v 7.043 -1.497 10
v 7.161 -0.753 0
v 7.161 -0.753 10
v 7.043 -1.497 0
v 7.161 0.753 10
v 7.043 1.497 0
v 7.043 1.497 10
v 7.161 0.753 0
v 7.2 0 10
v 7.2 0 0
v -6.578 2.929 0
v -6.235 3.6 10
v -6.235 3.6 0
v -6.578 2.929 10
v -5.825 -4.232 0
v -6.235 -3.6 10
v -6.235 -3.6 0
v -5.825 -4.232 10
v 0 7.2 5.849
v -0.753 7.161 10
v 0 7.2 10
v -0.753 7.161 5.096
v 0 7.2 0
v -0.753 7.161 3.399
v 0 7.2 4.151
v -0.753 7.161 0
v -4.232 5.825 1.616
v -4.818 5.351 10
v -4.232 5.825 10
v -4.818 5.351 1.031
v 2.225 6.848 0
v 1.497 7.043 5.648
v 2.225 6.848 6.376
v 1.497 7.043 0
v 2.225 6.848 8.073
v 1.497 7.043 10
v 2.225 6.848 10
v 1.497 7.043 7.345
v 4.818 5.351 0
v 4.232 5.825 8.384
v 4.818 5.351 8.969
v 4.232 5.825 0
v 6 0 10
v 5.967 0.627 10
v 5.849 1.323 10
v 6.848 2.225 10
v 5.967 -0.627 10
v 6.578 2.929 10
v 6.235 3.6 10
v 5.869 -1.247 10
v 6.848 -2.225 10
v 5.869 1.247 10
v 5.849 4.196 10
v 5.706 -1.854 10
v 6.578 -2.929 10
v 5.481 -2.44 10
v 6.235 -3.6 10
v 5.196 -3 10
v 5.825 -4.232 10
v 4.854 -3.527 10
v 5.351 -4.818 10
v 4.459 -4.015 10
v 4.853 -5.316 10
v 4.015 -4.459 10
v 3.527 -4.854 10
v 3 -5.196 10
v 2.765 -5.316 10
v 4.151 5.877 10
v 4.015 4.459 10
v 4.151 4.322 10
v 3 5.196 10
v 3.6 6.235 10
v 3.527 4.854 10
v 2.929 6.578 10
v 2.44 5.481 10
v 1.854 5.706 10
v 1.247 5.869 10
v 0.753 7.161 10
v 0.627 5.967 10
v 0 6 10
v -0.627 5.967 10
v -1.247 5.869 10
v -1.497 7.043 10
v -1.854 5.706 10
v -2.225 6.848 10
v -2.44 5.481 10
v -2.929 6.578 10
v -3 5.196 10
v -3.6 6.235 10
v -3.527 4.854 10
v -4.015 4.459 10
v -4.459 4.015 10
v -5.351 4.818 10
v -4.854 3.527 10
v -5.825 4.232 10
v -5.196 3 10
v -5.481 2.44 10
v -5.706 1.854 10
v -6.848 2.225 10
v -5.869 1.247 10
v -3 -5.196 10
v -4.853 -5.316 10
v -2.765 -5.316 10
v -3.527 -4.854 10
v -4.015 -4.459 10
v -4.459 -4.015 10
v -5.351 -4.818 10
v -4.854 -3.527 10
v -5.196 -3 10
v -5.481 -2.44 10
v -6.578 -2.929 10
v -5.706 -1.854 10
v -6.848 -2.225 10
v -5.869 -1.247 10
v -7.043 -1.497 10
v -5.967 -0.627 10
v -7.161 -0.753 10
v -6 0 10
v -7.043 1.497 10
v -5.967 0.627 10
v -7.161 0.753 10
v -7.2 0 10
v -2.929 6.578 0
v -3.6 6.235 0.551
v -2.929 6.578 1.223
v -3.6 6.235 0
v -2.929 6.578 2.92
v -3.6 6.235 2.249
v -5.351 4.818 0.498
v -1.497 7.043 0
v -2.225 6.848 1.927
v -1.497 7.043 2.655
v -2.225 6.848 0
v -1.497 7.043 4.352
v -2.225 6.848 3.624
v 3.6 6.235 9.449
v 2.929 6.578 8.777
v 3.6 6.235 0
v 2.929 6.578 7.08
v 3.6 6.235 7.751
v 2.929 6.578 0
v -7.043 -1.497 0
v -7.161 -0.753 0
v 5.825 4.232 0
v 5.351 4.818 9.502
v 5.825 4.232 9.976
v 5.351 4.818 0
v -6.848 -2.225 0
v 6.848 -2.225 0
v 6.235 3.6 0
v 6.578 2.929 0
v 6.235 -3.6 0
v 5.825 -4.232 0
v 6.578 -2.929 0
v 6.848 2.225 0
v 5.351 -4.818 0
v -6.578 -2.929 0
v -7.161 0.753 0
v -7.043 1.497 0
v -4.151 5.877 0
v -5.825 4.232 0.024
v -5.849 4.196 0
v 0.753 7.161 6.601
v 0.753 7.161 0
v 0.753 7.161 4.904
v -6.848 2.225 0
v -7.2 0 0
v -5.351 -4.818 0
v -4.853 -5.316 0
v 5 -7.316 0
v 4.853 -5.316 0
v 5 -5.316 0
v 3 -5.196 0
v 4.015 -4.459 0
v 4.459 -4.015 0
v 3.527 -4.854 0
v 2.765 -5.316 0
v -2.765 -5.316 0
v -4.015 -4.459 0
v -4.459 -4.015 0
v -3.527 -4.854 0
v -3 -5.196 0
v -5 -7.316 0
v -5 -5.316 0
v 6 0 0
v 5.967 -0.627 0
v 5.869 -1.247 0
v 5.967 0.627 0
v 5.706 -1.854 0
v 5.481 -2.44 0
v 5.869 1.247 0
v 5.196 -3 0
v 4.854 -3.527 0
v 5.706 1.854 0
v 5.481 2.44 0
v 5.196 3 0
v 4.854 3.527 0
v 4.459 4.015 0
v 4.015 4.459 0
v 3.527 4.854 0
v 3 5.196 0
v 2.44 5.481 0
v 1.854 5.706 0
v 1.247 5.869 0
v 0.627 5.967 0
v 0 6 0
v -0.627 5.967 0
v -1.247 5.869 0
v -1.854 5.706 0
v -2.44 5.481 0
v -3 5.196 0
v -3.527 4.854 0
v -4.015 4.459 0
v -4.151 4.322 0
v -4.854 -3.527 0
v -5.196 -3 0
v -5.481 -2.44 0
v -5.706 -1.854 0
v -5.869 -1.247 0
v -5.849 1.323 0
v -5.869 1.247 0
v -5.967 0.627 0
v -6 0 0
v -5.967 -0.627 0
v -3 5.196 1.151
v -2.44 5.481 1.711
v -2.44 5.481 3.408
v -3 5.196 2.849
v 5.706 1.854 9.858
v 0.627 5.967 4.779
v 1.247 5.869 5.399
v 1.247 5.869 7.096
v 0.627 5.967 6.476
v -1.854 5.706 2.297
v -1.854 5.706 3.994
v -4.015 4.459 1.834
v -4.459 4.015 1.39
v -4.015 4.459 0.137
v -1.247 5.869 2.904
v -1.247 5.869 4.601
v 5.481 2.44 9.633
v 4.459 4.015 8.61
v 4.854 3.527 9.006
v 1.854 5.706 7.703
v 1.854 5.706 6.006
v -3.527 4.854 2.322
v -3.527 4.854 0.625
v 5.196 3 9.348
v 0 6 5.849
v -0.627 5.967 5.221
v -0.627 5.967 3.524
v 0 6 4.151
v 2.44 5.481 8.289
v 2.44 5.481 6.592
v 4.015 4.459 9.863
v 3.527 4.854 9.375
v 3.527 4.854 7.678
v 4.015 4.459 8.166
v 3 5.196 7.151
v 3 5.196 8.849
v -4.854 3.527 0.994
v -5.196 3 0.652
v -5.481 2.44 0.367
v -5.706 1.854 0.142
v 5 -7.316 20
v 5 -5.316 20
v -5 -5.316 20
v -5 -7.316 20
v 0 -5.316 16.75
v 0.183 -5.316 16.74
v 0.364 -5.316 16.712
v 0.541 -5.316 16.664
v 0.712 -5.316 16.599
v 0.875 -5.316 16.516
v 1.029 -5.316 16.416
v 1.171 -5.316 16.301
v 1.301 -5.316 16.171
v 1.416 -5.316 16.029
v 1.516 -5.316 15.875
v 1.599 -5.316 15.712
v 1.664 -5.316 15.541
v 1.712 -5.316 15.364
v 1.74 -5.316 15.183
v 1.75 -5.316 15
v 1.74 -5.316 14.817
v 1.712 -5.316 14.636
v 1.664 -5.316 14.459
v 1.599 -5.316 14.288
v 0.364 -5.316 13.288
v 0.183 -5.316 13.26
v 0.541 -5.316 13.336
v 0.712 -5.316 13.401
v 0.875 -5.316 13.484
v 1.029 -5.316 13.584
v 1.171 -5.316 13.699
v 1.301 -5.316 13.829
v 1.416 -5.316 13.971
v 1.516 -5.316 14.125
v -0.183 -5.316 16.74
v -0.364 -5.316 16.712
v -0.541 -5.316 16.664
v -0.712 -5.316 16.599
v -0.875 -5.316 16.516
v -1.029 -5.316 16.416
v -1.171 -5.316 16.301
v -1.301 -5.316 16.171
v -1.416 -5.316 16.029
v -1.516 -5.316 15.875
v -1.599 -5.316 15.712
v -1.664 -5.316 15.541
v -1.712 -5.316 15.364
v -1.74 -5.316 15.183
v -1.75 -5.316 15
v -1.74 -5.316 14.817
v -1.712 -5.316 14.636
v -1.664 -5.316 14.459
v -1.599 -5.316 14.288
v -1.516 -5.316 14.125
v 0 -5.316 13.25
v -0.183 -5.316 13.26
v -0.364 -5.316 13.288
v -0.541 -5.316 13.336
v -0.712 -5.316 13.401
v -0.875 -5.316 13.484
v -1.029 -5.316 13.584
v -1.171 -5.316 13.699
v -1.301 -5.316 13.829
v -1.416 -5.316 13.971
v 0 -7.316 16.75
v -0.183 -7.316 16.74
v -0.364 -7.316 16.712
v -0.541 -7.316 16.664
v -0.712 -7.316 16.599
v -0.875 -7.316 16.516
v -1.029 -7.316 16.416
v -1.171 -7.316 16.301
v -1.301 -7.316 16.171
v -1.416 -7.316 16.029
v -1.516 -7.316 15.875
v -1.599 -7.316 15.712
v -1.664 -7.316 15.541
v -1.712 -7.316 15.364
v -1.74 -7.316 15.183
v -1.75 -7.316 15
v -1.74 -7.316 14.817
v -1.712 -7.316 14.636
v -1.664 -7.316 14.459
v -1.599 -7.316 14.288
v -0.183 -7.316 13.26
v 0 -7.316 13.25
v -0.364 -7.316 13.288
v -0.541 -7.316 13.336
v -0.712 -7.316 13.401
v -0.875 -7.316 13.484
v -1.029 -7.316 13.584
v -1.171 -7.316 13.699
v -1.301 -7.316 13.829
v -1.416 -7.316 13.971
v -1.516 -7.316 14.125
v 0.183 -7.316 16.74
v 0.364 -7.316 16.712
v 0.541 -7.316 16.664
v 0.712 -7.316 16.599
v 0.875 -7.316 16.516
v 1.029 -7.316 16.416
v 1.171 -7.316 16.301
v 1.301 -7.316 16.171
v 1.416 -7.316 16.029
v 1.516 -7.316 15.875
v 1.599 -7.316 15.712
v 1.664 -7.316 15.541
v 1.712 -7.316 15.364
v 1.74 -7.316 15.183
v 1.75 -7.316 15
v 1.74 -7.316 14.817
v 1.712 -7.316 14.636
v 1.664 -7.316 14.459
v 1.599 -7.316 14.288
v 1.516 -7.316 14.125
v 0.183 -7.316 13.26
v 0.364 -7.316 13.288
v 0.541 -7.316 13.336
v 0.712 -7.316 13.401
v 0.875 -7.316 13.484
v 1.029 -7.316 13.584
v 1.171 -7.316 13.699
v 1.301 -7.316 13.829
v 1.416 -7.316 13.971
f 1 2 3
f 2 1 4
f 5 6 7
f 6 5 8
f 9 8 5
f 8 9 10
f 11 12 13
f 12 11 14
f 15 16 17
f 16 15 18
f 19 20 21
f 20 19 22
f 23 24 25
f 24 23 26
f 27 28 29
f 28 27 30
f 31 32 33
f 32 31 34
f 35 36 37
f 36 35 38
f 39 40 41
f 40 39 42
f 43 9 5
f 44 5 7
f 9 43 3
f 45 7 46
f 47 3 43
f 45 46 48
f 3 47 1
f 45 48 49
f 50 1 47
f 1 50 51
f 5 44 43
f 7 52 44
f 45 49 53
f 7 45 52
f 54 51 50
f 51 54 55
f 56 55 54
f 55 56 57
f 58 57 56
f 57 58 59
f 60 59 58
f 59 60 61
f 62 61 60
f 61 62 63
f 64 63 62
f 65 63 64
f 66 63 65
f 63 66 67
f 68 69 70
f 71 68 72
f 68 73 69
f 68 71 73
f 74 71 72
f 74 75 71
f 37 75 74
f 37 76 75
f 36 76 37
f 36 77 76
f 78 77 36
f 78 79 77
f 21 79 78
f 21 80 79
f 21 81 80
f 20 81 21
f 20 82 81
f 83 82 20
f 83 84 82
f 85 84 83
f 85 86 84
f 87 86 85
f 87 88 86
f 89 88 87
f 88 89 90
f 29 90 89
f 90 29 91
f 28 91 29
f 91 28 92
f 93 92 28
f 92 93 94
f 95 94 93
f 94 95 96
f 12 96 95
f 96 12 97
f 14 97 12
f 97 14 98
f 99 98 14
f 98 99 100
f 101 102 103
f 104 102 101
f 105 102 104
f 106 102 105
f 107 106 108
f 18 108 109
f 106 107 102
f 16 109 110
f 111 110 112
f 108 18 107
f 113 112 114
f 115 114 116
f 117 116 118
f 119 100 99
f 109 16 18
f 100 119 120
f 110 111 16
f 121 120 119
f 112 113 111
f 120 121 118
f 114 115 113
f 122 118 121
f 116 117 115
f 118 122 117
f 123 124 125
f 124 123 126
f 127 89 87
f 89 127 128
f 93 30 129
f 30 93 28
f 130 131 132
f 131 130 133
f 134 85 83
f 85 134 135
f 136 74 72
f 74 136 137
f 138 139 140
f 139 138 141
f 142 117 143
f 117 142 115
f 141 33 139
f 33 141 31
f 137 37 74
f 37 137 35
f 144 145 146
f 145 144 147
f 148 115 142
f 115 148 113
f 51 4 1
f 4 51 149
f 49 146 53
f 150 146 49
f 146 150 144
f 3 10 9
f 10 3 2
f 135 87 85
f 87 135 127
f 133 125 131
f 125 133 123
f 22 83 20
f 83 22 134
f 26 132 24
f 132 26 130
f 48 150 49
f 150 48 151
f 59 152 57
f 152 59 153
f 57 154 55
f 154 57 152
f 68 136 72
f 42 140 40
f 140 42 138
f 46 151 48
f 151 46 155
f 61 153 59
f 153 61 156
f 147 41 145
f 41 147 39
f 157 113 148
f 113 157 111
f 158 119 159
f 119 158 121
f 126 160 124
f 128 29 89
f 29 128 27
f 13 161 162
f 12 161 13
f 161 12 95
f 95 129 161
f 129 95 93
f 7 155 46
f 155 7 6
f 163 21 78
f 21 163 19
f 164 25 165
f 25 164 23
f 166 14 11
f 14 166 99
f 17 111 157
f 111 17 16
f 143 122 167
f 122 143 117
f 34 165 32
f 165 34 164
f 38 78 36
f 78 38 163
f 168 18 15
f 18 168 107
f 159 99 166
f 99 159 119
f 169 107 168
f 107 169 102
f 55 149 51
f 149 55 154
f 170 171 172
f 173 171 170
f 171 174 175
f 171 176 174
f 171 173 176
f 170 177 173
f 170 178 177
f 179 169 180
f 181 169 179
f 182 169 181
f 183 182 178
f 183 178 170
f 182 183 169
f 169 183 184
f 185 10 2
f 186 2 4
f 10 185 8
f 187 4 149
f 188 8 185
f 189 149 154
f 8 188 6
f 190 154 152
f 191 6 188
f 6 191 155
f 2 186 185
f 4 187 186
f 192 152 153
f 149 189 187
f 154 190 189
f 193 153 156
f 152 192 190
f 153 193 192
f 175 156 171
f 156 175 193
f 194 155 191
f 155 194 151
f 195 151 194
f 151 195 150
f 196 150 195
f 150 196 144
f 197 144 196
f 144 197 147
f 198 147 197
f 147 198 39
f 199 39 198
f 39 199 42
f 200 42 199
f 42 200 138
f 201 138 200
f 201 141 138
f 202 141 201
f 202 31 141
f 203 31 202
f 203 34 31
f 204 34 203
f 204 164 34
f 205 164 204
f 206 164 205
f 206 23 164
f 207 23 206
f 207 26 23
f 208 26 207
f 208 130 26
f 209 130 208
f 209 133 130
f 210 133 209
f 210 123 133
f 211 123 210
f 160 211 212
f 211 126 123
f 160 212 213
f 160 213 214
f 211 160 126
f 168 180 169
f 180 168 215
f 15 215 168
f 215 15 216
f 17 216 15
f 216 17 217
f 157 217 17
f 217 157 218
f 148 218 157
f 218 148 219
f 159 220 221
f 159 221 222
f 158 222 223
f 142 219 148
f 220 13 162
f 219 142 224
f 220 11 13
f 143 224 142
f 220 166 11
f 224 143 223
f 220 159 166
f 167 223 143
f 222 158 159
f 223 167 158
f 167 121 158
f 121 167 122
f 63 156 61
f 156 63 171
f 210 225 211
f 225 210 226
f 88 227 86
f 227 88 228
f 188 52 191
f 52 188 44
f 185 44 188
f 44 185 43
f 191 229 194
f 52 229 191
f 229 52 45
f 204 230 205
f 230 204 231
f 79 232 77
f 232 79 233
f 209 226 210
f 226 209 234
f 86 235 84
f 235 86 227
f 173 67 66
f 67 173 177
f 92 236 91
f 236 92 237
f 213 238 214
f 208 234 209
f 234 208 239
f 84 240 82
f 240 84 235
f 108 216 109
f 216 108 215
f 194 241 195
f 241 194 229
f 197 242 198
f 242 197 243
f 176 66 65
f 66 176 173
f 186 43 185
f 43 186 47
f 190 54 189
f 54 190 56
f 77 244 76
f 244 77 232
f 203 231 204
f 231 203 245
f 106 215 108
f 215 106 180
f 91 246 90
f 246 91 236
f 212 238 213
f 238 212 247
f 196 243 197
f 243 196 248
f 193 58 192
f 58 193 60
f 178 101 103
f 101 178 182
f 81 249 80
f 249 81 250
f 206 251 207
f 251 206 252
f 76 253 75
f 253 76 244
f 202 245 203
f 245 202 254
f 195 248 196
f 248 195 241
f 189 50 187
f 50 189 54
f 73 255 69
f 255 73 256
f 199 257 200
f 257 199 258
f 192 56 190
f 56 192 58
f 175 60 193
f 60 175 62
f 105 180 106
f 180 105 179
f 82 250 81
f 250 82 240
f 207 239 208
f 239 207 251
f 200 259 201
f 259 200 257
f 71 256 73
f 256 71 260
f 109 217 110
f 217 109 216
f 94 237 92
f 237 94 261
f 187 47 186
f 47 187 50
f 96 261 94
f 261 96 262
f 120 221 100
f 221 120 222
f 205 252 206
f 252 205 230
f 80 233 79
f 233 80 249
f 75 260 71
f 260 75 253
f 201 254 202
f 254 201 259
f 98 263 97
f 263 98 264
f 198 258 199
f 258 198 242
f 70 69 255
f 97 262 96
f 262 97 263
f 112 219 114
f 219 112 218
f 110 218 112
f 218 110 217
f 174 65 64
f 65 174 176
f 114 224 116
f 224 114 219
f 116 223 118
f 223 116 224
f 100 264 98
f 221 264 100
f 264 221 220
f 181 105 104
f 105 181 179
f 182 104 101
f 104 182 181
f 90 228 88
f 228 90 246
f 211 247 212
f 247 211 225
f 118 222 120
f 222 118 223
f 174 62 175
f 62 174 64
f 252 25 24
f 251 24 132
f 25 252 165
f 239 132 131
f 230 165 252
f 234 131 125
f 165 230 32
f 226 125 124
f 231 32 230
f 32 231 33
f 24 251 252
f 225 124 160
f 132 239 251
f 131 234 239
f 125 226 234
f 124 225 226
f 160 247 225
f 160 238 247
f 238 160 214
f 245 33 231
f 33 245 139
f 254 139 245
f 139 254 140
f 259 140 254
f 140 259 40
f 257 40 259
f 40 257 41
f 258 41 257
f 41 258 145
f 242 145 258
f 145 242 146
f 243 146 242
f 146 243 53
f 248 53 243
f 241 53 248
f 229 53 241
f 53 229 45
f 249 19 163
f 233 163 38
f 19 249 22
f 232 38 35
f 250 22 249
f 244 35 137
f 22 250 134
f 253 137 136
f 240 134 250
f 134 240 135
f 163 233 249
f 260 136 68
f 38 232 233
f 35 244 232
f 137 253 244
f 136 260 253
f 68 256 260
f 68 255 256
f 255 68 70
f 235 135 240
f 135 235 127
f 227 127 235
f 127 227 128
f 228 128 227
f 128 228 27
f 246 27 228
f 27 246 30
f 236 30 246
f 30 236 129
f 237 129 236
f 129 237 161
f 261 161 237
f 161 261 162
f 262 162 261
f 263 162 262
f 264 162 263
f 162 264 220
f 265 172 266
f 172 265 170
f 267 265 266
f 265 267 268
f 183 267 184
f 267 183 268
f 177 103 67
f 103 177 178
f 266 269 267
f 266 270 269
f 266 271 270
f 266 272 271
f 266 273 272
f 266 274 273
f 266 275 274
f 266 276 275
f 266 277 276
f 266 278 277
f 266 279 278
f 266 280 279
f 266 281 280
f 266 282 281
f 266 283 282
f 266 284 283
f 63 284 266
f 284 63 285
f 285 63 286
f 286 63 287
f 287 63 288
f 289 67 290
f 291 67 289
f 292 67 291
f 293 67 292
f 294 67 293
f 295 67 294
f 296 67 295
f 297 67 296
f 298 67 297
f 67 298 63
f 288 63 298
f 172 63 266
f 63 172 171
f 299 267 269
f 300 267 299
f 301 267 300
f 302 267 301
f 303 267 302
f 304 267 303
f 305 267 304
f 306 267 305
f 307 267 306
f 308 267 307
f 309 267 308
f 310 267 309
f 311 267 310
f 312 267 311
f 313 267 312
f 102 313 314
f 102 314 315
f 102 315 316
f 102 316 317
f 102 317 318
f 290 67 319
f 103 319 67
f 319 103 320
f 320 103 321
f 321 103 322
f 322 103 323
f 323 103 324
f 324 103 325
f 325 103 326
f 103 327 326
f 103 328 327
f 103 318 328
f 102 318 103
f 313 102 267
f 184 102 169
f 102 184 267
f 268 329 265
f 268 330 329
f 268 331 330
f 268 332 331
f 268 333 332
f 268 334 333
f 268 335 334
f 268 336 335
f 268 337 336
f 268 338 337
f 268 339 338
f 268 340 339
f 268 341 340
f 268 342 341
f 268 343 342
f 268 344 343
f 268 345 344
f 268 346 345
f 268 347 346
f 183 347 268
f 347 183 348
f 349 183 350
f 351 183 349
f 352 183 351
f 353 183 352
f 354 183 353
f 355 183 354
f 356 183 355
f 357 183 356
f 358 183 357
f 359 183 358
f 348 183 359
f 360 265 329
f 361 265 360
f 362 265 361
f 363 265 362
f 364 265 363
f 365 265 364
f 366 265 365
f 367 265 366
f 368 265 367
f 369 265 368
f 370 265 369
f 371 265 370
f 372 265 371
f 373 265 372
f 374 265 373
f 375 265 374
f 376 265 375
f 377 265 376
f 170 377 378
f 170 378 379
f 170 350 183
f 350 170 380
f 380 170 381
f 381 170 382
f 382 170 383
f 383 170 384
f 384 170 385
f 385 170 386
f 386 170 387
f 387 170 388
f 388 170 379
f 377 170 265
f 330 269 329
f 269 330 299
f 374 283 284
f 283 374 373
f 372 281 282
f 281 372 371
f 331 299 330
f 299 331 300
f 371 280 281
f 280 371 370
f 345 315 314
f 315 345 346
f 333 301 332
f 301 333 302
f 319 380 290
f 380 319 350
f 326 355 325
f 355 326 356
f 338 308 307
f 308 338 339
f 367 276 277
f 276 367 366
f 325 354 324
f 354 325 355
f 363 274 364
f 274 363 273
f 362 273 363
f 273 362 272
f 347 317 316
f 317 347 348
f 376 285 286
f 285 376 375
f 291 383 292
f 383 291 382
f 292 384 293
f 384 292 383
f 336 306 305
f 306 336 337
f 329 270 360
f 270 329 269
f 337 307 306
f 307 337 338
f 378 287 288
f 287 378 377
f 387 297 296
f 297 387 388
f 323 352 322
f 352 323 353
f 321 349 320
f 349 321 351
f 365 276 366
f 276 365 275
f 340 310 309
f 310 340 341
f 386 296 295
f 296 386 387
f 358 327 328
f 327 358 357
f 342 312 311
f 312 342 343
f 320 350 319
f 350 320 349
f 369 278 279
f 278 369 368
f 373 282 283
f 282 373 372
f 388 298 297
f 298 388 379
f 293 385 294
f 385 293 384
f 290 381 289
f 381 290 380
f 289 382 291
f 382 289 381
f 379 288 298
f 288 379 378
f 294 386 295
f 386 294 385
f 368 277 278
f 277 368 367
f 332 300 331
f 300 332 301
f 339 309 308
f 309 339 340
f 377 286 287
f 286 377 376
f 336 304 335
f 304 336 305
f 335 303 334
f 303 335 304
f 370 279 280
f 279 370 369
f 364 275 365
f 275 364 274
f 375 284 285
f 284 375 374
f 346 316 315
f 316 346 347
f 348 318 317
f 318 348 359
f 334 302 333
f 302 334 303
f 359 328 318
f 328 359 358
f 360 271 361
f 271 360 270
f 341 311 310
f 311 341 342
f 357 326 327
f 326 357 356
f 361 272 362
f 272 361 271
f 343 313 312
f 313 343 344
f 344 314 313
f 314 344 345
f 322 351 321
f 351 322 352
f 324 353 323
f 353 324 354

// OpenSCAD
$fn=60;

module clip(clip_d=10, h=8) {
    wall = clip_d/10;
    difference() {
        cylinder(d=clip_d+2*wall, h=h);
        cylinder(d=clip_d, h=h);
        translate([0,clip_d/2,h/2]) rotate([0,45,0]) cube([wall, clip_d, 25], center=true);
    }
}

module cable_clip_small(clip_d=10, h=8) {
    union() {
        clip(clip_d, h);
        difference() {
            translate([0,-clip_d/1.9,(10+h)/2]) cube([10,2,10+h], center=true);
            translate([0,0,(10+h)-5]) rotate([90,0,0]) cylinder(d=3.5,h=20);
        }
    }
}

//cable_clip_small(10, 8);
cable_clip_small(12, 10);
